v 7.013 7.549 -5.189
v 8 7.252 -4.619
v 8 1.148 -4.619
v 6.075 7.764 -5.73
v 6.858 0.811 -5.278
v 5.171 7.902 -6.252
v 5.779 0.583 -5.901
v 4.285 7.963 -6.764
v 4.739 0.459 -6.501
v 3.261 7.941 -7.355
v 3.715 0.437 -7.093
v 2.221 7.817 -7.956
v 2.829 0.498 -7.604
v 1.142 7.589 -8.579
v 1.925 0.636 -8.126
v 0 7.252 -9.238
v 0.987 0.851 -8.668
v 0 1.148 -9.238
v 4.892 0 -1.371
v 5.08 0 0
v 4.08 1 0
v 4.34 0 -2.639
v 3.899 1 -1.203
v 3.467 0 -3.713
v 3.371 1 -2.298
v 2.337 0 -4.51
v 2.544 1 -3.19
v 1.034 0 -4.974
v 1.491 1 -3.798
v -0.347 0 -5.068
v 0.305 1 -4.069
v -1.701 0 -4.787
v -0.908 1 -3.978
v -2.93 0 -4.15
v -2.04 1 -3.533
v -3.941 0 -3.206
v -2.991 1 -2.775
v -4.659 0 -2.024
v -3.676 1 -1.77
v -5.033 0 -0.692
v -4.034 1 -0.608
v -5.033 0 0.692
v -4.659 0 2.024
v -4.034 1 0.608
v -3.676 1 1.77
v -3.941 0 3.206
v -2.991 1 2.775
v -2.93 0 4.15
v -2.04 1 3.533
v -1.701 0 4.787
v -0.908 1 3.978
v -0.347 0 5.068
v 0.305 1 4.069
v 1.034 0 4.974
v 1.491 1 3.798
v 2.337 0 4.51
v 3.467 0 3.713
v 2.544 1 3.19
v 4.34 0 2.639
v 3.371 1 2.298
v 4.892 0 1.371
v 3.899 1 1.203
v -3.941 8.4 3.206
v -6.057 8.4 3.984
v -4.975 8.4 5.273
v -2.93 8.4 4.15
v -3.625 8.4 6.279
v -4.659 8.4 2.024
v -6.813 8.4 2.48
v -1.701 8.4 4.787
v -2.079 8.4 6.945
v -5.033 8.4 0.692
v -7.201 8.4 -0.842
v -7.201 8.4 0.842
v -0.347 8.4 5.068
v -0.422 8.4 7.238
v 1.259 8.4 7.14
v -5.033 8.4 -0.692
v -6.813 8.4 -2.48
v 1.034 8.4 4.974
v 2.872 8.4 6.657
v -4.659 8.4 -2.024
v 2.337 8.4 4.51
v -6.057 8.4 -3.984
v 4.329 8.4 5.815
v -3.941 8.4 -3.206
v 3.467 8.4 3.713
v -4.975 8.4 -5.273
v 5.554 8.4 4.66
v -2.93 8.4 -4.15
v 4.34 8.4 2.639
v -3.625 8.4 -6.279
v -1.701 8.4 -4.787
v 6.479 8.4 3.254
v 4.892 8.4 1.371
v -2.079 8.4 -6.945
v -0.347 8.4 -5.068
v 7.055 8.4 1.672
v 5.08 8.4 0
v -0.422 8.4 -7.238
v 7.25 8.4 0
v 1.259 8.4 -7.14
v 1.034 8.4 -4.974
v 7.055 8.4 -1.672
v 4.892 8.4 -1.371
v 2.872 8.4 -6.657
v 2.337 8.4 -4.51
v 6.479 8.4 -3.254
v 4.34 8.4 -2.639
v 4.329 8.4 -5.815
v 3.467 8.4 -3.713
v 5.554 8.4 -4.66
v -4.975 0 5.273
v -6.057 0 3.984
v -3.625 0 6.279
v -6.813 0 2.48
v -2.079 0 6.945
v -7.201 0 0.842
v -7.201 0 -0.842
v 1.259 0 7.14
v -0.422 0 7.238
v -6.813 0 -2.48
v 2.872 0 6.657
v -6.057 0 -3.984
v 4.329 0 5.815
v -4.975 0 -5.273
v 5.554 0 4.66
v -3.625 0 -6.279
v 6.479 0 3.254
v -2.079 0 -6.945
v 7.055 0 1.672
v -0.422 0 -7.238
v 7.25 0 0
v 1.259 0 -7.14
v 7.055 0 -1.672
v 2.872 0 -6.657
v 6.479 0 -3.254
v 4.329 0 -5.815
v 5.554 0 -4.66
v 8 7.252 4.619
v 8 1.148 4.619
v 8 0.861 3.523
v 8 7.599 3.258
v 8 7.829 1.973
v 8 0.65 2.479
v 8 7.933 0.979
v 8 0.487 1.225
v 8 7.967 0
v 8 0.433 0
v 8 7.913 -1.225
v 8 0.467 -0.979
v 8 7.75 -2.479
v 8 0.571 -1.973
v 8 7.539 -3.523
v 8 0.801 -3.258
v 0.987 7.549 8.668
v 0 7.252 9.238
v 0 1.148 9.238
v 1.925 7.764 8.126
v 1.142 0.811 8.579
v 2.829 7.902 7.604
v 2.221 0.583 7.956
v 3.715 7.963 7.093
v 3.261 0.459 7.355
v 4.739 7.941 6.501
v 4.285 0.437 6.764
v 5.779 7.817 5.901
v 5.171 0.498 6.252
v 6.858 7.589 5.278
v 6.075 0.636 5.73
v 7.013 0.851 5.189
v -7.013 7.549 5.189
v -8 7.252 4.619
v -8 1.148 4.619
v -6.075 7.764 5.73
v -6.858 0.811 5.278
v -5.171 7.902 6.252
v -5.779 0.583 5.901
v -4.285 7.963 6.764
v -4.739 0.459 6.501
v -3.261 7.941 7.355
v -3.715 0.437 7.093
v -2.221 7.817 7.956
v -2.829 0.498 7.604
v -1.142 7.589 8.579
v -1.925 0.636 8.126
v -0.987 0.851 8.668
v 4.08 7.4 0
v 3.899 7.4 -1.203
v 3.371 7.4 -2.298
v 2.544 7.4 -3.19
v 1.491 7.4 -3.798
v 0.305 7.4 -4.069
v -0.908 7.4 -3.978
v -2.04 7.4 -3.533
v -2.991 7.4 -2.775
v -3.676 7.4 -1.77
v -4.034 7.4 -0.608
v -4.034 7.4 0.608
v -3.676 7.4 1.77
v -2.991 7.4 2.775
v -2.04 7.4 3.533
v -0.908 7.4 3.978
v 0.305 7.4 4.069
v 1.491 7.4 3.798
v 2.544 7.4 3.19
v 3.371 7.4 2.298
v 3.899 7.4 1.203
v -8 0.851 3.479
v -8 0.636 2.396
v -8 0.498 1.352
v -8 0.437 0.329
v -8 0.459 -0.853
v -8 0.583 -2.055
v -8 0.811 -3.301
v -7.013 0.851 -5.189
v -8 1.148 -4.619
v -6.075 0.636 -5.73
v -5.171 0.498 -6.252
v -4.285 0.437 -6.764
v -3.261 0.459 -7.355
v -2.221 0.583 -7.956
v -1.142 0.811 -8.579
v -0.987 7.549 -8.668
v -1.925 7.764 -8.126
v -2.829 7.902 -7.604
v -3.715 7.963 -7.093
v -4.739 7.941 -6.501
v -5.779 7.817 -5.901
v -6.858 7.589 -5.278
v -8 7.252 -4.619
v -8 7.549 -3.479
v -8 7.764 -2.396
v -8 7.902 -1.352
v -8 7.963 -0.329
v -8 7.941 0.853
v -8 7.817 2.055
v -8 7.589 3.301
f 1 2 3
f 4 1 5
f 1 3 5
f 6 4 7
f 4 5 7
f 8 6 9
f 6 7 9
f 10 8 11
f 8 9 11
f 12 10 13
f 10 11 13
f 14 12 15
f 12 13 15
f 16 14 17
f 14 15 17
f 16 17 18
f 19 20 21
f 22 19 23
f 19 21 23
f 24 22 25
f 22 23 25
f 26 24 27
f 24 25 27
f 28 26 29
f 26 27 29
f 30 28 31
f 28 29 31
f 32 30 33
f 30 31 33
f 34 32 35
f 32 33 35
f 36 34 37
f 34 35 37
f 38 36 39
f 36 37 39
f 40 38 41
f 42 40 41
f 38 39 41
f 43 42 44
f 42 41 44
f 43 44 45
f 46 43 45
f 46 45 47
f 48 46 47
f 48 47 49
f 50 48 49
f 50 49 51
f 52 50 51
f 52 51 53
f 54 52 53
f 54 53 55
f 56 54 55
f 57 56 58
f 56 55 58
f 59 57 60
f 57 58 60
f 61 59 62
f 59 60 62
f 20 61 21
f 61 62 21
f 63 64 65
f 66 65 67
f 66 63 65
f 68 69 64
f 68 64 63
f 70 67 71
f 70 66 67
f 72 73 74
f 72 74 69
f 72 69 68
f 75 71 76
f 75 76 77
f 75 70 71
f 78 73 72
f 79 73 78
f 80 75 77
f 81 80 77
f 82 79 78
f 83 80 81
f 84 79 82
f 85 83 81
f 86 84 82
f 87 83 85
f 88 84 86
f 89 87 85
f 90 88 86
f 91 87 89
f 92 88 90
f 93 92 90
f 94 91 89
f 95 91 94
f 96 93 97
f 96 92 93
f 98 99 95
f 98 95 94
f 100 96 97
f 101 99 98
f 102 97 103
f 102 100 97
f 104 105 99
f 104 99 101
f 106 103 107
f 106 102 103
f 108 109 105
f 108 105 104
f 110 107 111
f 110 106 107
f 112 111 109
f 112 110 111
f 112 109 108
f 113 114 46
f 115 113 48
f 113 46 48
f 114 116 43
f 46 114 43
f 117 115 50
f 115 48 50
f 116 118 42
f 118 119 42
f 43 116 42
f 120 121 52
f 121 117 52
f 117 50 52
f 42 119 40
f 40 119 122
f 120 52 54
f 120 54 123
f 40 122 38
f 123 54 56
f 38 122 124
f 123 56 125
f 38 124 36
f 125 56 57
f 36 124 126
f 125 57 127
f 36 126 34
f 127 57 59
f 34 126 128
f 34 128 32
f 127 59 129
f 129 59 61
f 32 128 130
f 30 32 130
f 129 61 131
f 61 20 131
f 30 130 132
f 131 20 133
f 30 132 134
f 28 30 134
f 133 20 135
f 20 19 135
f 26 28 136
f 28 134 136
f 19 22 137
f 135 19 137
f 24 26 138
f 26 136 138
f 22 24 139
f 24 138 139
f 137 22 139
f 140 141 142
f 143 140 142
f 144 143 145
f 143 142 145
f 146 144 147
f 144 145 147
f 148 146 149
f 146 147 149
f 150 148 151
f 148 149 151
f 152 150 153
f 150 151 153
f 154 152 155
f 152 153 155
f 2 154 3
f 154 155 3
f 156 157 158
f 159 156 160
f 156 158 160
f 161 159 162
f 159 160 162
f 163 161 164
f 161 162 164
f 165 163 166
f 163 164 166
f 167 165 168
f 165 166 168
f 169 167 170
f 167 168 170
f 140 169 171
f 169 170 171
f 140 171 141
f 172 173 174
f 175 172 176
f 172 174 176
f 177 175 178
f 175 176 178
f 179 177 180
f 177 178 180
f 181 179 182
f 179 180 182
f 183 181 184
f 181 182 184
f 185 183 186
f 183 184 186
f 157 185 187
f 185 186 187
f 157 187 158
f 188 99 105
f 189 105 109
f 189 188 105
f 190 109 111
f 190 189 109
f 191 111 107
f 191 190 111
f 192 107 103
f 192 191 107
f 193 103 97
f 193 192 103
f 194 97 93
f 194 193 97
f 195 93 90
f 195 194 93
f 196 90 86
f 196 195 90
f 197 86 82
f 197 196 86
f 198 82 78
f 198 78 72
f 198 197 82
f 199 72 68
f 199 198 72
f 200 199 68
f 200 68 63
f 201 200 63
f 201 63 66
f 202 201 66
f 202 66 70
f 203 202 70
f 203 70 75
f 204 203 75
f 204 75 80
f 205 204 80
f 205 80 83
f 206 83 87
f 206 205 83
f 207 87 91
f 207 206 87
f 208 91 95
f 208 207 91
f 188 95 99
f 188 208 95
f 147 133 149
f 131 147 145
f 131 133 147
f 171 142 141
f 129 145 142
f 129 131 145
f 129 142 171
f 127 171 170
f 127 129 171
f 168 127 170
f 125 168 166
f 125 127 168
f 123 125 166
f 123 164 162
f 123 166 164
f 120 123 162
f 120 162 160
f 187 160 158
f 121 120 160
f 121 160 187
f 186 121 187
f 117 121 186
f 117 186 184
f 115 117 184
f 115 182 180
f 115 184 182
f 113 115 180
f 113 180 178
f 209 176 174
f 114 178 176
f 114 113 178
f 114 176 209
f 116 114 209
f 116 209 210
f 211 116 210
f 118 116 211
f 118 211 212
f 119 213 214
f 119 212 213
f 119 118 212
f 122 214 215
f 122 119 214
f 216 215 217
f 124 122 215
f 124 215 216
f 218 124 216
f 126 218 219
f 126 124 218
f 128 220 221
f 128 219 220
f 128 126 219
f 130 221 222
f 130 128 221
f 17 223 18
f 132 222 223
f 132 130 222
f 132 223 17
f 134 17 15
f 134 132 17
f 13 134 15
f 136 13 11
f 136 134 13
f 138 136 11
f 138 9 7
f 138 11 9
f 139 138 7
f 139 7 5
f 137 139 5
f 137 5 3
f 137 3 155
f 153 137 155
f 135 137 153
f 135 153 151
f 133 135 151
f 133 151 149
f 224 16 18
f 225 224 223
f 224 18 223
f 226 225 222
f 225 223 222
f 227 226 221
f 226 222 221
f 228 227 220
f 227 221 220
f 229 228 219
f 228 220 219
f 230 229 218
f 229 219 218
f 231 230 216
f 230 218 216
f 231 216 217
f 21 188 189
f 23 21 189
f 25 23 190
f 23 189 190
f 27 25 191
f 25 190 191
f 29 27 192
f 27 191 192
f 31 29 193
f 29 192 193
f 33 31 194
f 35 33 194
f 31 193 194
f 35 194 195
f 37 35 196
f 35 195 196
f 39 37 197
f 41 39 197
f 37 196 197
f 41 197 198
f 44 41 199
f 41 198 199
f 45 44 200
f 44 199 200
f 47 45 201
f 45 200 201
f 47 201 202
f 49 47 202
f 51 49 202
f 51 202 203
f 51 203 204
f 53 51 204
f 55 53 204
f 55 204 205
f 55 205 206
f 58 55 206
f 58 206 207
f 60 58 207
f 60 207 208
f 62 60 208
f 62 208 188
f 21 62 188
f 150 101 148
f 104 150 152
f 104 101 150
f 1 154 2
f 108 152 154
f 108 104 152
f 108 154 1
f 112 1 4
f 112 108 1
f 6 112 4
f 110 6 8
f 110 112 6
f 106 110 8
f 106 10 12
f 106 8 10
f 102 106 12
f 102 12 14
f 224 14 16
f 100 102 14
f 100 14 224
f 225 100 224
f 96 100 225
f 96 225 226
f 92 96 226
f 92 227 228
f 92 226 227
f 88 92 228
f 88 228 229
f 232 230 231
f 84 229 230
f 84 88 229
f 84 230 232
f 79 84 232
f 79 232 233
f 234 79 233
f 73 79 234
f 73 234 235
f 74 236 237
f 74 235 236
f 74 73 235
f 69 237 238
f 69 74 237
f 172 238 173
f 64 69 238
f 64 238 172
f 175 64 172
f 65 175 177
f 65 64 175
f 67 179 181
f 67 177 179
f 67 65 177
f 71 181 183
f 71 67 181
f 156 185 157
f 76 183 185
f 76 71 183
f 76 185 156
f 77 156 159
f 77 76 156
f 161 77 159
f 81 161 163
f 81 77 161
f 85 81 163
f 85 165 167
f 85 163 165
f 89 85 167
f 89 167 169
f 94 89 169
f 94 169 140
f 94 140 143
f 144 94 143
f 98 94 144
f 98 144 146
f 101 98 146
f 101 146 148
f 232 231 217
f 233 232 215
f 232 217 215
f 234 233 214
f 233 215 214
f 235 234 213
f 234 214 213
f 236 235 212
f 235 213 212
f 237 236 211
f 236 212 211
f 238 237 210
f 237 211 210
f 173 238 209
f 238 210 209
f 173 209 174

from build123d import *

# Parameters (mm, degrees)
EXTRUDE_1_DEPTH     = 8.4
M10X1_51_D          = 8.16
CHAMFER_1_SIZE      = 1
SKETCH_5_OUTSIDE_W  = 78.002
SKETCH_5_OUTSIDE_H  = 80.478
SKETCH_5_OUTSIDE_R  = 7.25
CUT_EXTRUDE_1_DEPTH = 15.828800806
CUT_EXTRUDE_1_DRAFT = -60
SKETCH_6_OUTSIDE_W  = 78.002
SKETCH_6_OUTSIDE_H  = 80.478
SKETCH_6_OUTSIDE_R  = 7.25
CUT_EXTRUDE_2_DEPTH = 15.828800806
CUT_EXTRUDE_2_DRAFT = -60


with BuildPart() as part:
    # Эскиз1 → Бобышка-Вытянуть1 (new body)
    with BuildSketch(Plane(origin=(0, 0, 0), x_dir=(1, 0, 0), z_dir=(0, 1, 0))):
        Polygon((0, 9.237604307), (-8, 4.618802154), (-8, -4.618802154), (0, -9.237604307), (8, -4.618802154), (8, 4.618802154), align=None)
    extrude(amount=EXTRUDE_1_DEPTH)

    # Отверстие обработанное метчиком M10x1.51 (through all)
    with Locations(Plane(origin=(0, 0, 0), x_dir=(-1, 0, 0), z_dir=(0, -1, 0))):
        with Locations((0, 0)):
            Hole(M10X1_51_D / 2)

    # Фаска1
    chamfer_1_edges = [part.edges().sort_by_distance(p)[0] for p in [
        (-4.08, 0, 0),
        (-4.08, 8.4, 0),
    ]]
    chamfer(chamfer_1_edges, length=CHAMFER_1_SIZE)


with BuildPart() as cut_extrude_1_tool:
    # Эскиз5 outside → Вырез-Вытянуть1 (with draft: the straight prism first)
    with BuildSketch(Plane.XZ):
        Rectangle(SKETCH_5_OUTSIDE_W, SKETCH_5_OUTSIDE_H)
        Circle(SKETCH_5_OUTSIDE_R, mode=Mode.SUBTRACT)
    extrude(amount=-CUT_EXTRUDE_1_DEPTH)
    # Вырез-Вытянуть1: the draft: its side faces are tilted about the plane it starts from
    cut_extrude_1_sides = [cut_extrude_1_tool.faces().sort_by_distance(p)[0] for p in [
        (0, 7.914400403, -40.239),
        (39.001, 7.914400403, 0),
        (0, 7.914400403, 40.239),
        (-39.001, 7.914400403, 0),
        (-7.25, 7.914400403, 0),
    ]]
    draft(cut_extrude_1_sides, Plane.XZ, CUT_EXTRUDE_1_DRAFT)


with BuildPart() as part_1:
    add(part.part)

    # Вырез-Вытянуть1: cut by cut_extrude_1_tool
    add(cut_extrude_1_tool.part, mode=Mode.SUBTRACT)


with BuildPart() as cut_extrude_2_tool:
    # Эскиз6 outside → Вырез-Вытянуть2 (with draft: the straight prism first)
    with BuildSketch(Plane(origin=(0, 8.4, 0), x_dir=(1, 0, 0), z_dir=(0, 1, 0))):
        Rectangle(SKETCH_6_OUTSIDE_W, SKETCH_6_OUTSIDE_H)
        Circle(SKETCH_6_OUTSIDE_R, mode=Mode.SUBTRACT)
    extrude(amount=-CUT_EXTRUDE_2_DEPTH)
    # Вырез-Вытянуть2: the draft: its side faces are tilted about the plane it starts from
    cut_extrude_2_sides = [cut_extrude_2_tool.faces().sort_by_distance(p)[0] for p in [
        (0, 0.485599597, 40.239),
        (39.001, 0.485599597, 0),
        (0, 0.485599597, -40.239),
        (-39.001, 0.485599597, 0),
        (-7.25, 0.485599597, 0),
    ]]
    draft(cut_extrude_2_sides, Plane(origin=(0, 8.4, 0), x_dir=(1, 0, 0), z_dir=(0, 1, 0)), CUT_EXTRUDE_2_DRAFT)


with BuildPart() as part_2:
    add(part_1.part)

    # Вырез-Вытянуть2: cut by cut_extrude_2_tool
    add(cut_extrude_2_tool.part, mode=Mode.SUBTRACT)


solid = part_2.part
